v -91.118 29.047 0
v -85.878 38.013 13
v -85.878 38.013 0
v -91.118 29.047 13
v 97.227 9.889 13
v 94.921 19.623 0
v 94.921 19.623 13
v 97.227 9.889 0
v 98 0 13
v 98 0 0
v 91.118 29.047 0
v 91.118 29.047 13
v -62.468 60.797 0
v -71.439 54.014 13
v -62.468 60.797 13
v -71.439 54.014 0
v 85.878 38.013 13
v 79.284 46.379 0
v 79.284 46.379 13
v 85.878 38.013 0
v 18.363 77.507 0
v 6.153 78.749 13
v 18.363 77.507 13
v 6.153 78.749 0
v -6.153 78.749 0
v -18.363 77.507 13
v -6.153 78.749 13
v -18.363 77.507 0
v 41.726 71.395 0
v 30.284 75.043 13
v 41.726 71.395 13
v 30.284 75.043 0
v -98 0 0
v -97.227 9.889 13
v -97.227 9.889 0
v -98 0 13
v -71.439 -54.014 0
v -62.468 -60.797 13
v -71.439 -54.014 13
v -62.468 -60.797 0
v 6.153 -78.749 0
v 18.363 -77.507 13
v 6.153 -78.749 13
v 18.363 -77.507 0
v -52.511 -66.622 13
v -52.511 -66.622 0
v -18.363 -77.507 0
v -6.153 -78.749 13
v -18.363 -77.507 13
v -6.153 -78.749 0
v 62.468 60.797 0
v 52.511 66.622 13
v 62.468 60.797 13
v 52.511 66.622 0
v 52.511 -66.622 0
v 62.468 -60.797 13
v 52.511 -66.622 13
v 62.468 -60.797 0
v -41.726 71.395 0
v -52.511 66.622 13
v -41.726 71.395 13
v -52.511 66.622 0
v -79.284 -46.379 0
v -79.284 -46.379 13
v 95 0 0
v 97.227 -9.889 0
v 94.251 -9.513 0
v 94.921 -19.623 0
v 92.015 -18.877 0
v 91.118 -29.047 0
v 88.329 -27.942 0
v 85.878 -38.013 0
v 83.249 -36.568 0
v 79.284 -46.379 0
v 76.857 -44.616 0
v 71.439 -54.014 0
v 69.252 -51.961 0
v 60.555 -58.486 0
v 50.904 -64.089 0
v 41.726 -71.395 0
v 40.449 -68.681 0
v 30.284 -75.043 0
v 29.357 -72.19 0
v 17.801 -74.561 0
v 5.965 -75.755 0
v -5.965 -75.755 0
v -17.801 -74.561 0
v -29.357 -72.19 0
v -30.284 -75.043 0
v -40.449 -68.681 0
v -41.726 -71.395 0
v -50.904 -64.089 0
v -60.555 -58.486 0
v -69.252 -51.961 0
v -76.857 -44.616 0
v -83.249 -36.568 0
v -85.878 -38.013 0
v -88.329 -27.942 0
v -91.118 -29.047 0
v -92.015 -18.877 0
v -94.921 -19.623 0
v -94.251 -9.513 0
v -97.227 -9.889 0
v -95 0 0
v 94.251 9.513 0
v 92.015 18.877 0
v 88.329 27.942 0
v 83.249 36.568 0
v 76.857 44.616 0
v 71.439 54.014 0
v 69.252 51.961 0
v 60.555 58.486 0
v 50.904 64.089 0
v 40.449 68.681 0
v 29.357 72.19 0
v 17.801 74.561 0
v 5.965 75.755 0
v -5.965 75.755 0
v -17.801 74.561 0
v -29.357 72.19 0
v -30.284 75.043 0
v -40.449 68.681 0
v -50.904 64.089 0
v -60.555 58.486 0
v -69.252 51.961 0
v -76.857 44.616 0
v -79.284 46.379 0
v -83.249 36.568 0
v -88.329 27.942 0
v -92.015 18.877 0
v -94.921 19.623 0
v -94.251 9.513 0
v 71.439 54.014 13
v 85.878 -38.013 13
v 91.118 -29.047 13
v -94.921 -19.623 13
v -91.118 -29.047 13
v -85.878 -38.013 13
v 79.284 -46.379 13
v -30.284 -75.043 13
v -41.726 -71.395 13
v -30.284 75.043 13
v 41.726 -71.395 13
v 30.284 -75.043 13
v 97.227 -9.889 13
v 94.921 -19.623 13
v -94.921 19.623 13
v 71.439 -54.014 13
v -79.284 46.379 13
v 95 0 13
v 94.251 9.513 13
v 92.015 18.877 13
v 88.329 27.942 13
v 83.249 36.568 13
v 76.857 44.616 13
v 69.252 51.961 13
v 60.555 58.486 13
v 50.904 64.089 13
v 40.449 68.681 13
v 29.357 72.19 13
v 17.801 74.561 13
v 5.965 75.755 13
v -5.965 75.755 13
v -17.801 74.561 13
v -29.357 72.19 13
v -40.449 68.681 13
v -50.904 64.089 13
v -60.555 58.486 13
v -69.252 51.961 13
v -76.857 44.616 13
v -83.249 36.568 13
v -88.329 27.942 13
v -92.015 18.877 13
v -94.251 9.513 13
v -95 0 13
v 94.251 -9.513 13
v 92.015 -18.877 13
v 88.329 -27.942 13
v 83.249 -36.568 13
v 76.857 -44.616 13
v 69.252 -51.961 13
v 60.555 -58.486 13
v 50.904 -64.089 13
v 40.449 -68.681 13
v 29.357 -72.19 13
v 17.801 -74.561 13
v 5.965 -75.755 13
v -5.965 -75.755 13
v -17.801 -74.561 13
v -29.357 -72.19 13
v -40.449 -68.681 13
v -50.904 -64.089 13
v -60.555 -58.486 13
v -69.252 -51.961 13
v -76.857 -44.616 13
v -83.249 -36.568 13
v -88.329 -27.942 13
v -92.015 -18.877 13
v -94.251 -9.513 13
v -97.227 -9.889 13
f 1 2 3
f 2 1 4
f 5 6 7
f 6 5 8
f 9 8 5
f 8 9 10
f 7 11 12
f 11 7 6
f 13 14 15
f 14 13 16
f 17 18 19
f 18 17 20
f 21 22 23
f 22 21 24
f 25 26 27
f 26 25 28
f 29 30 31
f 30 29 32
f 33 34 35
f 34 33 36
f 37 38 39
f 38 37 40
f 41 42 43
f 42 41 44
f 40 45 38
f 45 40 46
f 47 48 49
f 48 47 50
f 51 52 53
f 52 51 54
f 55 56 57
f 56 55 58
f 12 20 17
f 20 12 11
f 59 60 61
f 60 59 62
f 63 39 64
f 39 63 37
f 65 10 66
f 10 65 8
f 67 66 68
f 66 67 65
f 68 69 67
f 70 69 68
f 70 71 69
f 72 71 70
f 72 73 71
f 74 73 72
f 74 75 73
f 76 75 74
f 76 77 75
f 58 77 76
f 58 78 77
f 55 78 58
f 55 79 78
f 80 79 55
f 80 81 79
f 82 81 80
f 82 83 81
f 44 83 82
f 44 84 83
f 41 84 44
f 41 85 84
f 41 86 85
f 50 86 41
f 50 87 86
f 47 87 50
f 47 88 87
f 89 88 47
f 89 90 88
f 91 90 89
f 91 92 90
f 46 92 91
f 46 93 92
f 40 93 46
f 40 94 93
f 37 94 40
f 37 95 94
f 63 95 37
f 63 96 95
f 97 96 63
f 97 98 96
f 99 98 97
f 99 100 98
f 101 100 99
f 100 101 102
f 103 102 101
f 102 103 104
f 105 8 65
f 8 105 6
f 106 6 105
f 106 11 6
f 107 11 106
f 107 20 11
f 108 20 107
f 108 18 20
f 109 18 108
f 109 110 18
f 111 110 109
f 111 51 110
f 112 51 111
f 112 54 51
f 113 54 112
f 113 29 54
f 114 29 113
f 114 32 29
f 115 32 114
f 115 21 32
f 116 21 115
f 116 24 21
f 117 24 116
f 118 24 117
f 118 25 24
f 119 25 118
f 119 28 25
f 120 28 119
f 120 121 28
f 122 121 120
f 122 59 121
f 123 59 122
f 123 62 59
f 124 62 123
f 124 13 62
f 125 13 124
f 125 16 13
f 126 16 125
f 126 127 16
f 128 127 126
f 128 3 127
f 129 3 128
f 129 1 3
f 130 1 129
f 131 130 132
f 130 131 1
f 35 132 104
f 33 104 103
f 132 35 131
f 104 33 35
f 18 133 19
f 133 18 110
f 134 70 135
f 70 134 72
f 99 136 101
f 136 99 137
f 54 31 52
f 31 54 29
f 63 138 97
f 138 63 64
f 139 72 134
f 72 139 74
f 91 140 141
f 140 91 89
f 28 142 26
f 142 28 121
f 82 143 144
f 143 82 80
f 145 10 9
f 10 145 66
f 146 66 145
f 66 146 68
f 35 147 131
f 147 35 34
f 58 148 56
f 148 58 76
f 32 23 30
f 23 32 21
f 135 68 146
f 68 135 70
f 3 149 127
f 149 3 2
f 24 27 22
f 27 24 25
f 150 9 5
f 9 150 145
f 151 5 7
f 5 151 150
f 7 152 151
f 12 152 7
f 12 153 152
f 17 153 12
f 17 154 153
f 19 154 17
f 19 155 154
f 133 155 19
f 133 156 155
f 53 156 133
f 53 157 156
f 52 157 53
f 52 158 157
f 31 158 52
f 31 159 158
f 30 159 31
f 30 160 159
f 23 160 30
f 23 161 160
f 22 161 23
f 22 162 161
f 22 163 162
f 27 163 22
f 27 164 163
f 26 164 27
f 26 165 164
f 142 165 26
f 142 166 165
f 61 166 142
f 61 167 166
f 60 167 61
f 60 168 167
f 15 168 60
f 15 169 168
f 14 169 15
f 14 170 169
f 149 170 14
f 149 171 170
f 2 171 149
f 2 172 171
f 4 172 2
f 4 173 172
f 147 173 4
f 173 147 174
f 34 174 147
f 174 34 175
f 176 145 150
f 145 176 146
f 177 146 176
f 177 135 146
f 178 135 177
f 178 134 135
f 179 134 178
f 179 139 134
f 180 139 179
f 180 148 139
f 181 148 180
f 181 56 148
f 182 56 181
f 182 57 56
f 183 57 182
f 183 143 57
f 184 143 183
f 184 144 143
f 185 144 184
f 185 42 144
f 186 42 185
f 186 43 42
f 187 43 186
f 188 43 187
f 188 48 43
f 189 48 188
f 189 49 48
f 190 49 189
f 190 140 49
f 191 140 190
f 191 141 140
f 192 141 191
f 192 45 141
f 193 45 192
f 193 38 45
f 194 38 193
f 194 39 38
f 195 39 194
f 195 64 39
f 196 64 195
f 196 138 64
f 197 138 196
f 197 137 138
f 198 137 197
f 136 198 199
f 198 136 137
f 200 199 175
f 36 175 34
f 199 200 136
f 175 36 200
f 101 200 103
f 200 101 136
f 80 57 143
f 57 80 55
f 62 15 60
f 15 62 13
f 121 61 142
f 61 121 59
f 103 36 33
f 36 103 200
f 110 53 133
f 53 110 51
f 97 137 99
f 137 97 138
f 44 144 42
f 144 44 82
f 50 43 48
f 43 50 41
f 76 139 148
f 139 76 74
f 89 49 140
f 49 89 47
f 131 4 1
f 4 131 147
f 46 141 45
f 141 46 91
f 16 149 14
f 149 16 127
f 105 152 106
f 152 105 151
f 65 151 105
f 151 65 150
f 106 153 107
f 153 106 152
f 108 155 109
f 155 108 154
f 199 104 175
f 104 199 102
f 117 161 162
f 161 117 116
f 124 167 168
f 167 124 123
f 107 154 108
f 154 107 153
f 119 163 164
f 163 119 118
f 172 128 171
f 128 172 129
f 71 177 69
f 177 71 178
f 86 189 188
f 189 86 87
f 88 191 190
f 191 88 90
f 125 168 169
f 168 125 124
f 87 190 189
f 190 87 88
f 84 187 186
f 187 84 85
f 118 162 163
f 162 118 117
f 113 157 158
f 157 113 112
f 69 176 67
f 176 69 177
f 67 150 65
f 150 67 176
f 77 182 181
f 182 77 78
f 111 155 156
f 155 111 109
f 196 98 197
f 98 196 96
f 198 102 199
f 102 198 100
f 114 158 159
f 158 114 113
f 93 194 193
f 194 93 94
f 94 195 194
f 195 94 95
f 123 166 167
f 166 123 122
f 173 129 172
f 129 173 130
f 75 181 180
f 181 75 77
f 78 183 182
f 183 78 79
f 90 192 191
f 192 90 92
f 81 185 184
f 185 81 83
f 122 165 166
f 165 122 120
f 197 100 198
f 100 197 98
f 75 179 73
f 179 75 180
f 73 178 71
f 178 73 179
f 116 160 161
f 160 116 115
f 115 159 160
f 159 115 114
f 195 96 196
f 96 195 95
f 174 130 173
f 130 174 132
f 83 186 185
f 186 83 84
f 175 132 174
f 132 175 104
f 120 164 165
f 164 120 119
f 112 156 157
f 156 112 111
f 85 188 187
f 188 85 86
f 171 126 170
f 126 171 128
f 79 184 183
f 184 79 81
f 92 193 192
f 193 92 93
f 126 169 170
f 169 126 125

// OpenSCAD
BaseWidth=152*1;
BaseLength=190*1;


//Measure your head in mm with a sewing tape measure
HeadCircumference_mm = 540; //[450:750]
//13mm is a average size
BandHeight_mm=13;//[3:20]
//3mm thick is still flexible
BandThickness_mm=3;//[1:8]
//Determines number of sides / facets... more is smoother
$fn=50;

CircPercent = HeadCircumference_mm/540;
CalcLength = BaseLength*CircPercent/2;
CalcWidth = CalcLength*0.799;
echo(CalcLength);
echo(CalcWidth);

//Define an Oval (shape of band)
module oval(w,h, height, center = false) {
 scale([1, h/w, 1]) cylinder(h=height, r=w, center=center); 
};
//Create the Band, with hole in back for rear ornament

    difference() {oval (CalcLength+BandThickness_mm,CalcWidth+BandThickness_mm,BandHeight_mm,center=false,center=false);
translate ([0,0,-1]) oval (CalcLength,CalcWidth,BandHeight_mm+2,center=false);}
